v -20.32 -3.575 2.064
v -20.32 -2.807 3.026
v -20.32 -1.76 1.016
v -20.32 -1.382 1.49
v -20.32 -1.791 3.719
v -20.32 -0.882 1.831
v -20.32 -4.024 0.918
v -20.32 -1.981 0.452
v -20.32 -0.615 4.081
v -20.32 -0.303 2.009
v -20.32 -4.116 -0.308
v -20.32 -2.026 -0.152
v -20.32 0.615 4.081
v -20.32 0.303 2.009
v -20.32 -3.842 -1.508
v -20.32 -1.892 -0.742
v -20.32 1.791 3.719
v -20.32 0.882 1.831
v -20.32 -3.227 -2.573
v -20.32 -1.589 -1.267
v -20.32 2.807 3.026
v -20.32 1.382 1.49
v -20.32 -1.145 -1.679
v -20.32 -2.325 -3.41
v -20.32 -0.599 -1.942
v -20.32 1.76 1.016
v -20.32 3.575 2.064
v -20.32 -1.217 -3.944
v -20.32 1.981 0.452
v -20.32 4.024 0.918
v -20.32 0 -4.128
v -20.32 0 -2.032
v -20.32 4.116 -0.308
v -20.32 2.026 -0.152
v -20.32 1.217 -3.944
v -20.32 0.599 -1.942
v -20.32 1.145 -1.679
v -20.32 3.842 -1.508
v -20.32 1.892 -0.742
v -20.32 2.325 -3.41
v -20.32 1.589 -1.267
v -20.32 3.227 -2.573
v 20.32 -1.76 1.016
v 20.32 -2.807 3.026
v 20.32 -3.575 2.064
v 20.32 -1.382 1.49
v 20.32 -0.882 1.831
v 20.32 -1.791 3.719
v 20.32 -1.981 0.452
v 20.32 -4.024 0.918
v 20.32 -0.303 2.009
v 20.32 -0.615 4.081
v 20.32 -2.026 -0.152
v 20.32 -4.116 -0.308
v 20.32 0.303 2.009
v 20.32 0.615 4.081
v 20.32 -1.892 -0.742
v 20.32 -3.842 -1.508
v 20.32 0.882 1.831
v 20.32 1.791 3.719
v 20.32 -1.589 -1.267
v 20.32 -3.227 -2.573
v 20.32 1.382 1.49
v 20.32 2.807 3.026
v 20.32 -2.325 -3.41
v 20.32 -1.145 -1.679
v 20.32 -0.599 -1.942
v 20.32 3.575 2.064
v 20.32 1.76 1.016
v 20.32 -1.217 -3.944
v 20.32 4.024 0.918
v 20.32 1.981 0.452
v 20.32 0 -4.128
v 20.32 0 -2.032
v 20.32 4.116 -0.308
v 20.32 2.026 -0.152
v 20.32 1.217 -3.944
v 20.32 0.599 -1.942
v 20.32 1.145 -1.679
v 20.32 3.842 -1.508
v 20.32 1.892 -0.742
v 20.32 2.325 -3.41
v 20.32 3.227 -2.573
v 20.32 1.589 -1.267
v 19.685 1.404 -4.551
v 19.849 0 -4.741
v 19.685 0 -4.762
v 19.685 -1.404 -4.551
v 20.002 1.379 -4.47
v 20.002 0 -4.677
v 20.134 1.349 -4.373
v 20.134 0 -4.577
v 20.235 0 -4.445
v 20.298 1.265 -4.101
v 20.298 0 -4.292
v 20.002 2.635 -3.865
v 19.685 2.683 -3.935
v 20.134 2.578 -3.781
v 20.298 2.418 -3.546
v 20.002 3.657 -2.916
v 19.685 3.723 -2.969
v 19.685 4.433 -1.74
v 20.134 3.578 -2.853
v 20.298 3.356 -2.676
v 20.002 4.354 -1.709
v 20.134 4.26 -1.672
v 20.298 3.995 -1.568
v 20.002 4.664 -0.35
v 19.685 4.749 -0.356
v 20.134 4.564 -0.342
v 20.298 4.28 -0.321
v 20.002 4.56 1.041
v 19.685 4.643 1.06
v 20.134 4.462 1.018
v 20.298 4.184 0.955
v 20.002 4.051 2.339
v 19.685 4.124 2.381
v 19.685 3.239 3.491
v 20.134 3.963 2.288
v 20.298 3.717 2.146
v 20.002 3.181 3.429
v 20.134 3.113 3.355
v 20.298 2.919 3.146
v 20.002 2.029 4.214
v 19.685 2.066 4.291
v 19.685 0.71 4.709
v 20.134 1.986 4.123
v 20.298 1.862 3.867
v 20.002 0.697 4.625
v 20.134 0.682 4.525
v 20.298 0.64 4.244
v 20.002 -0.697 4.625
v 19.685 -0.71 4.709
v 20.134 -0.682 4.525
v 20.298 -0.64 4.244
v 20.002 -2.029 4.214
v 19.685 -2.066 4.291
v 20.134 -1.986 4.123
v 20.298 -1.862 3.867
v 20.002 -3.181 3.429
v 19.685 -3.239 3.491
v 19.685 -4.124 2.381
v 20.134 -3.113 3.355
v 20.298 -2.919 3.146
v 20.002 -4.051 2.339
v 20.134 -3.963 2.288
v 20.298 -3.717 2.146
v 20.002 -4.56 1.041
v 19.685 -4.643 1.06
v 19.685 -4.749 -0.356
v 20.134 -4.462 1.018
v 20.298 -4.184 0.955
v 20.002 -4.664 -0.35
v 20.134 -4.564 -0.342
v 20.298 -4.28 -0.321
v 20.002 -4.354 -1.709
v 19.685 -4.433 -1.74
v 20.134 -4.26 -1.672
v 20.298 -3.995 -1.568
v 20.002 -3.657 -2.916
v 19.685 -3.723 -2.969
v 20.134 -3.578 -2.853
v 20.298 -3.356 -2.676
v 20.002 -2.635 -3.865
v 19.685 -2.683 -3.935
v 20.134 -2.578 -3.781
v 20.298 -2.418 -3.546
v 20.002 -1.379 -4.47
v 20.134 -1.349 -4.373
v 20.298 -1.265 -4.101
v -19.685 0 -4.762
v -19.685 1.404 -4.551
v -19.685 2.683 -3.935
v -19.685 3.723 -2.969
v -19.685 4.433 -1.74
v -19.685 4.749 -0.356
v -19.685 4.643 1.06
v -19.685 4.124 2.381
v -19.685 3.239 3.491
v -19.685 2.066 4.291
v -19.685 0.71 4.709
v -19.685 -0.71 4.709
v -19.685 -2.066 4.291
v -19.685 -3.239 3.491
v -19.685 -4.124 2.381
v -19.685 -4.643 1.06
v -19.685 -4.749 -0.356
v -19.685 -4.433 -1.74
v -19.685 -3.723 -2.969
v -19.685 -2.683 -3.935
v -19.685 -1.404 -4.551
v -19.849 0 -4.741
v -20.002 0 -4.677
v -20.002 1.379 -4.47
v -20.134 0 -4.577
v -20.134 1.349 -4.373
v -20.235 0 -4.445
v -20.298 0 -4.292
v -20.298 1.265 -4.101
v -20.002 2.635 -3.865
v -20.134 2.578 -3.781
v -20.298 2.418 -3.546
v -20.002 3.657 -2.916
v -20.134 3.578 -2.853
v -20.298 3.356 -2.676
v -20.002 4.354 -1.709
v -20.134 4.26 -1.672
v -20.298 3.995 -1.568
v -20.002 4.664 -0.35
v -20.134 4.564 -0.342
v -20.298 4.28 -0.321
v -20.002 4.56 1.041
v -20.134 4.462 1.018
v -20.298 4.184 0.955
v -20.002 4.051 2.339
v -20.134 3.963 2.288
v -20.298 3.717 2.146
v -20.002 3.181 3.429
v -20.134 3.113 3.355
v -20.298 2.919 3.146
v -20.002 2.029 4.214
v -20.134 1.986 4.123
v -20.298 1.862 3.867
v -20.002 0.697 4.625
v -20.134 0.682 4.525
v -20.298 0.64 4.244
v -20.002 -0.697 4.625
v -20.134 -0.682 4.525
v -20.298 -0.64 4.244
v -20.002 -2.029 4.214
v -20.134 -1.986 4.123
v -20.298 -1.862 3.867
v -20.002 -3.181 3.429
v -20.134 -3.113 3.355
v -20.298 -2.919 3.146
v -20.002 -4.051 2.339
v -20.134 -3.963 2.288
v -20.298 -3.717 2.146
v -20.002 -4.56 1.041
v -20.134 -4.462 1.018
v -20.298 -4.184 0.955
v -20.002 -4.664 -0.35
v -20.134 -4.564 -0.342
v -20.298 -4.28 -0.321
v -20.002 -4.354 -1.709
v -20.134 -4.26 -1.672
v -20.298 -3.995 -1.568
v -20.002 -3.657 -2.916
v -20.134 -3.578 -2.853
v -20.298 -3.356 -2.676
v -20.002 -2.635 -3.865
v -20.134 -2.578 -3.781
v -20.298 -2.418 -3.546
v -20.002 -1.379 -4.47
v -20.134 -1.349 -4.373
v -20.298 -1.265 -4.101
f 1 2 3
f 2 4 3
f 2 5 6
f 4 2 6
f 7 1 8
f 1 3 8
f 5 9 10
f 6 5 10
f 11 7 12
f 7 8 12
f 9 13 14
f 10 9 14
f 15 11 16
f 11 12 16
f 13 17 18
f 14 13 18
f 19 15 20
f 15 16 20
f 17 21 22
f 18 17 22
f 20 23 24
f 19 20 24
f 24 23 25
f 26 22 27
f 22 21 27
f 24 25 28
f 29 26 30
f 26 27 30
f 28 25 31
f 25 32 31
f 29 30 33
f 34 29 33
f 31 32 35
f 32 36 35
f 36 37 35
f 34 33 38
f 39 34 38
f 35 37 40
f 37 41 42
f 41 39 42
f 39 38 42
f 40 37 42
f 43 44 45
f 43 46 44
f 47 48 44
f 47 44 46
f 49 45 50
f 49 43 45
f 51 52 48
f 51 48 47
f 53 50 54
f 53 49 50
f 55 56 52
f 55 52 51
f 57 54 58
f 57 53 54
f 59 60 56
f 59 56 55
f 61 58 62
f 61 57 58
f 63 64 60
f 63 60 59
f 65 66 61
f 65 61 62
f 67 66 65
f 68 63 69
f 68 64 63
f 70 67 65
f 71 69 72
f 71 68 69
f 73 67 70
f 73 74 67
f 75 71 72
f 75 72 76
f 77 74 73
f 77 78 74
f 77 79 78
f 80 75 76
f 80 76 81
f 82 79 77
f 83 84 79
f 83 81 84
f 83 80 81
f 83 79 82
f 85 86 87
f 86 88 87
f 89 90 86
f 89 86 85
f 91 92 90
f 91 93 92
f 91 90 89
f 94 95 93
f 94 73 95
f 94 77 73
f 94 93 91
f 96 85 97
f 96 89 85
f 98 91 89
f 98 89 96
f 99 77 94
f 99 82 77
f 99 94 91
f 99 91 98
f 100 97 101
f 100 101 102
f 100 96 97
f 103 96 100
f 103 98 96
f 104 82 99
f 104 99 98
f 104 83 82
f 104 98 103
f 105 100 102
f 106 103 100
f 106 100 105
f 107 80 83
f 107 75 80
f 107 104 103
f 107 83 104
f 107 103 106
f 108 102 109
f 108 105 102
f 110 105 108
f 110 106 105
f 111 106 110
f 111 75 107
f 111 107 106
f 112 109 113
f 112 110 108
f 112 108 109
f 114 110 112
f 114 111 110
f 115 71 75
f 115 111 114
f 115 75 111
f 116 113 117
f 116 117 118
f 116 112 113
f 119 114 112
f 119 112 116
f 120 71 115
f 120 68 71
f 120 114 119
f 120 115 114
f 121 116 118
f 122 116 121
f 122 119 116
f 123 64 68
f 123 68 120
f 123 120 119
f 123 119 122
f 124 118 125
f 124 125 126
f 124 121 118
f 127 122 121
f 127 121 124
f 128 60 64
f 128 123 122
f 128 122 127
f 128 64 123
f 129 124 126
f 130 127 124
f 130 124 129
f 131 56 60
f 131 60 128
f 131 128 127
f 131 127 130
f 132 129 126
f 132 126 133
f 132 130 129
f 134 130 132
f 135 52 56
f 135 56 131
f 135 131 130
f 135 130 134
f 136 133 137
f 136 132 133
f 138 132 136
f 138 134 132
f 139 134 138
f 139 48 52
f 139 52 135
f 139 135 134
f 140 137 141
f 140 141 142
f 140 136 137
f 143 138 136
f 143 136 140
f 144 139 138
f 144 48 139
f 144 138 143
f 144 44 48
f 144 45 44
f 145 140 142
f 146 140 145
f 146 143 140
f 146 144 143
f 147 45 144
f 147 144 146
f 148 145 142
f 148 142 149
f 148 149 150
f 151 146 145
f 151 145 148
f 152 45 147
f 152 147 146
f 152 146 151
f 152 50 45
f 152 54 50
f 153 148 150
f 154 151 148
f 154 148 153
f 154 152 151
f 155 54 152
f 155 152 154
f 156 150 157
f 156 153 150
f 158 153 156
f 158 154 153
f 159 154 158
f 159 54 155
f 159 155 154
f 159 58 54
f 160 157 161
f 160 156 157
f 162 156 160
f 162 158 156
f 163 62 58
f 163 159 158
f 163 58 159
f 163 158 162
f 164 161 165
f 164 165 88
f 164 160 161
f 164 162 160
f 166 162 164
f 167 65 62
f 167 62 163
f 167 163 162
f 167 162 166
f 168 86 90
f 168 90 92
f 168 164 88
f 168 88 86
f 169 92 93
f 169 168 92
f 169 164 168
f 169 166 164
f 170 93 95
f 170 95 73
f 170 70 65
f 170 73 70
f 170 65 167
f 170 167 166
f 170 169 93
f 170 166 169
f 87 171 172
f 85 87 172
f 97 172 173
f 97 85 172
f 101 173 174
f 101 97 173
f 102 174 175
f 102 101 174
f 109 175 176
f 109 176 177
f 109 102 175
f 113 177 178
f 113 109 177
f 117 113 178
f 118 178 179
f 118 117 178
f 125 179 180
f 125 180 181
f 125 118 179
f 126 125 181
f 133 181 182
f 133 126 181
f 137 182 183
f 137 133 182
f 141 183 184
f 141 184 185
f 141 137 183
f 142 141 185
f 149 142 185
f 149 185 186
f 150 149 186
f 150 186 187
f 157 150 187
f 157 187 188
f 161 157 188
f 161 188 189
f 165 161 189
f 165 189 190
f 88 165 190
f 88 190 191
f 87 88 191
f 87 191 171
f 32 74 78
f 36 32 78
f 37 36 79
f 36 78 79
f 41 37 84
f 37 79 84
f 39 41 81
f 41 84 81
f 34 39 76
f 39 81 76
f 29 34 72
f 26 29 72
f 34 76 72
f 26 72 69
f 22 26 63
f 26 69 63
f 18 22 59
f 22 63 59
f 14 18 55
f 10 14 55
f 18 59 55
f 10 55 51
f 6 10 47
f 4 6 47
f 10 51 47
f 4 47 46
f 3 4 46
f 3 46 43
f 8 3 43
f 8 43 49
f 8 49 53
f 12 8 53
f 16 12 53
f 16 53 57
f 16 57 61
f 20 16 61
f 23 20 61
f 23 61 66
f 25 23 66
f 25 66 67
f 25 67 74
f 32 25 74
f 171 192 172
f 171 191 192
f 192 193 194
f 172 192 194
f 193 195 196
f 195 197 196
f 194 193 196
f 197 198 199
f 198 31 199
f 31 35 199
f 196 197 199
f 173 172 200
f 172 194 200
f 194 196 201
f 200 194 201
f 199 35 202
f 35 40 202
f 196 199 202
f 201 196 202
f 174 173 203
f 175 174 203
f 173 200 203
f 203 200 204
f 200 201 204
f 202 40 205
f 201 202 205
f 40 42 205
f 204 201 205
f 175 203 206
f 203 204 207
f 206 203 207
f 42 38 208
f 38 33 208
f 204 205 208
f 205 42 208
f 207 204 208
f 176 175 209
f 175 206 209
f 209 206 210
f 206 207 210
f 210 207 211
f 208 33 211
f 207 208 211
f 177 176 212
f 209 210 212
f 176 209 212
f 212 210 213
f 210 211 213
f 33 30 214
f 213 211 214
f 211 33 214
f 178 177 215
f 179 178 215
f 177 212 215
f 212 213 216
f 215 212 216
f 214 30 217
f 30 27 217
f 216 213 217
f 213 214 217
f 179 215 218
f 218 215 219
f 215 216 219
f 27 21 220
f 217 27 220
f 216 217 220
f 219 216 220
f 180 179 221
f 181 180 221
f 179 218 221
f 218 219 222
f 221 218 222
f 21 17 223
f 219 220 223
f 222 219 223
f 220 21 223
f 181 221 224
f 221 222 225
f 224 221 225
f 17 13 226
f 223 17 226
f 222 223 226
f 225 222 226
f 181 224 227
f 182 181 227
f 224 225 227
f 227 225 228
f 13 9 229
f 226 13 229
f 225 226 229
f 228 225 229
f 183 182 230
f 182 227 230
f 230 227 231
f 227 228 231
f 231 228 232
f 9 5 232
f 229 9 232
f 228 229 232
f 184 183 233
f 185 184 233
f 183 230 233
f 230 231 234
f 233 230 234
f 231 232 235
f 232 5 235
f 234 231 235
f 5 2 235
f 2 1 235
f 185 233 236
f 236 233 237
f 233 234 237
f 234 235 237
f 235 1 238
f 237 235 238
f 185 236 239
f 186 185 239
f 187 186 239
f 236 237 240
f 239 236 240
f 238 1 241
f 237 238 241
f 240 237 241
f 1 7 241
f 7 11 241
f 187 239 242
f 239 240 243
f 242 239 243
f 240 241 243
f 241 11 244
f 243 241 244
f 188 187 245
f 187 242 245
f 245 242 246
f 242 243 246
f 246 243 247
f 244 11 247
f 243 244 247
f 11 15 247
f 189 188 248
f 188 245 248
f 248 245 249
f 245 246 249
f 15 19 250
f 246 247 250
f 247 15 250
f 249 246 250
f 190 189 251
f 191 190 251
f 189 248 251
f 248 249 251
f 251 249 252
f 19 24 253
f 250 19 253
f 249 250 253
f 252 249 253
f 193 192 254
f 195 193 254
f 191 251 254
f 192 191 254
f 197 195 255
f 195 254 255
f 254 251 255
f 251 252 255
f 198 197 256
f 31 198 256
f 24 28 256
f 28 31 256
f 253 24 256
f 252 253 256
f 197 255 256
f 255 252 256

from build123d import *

# Parameters (mm, degrees)
SKETCH1_R           = 4.7625
BOSS_EXTRUDE1_DEPTH = 20.32
SKETCH3_R           = 2.032
CUT_EXTRUDE1_DEPTH  = 42.194325004
FILLET1_R           = 0.635


with BuildPart() as part:
    # Sketch1 → Boss-Extrude1 (new, symmetric)
    with BuildSketch(Plane(origin=(0, 0, 0), x_dir=(0, 0, -1), z_dir=(1, 0, 0))):
        Circle(SKETCH1_R)
    extrude(amount=BOSS_EXTRUDE1_DEPTH, both=True)

    # Sketch3 → Cut-Extrude1 (cut, through all)
    with BuildSketch(Plane(origin=(20.32, 0, 0), x_dir=(0, 0, -1), z_dir=(1, 0, 0))):
        Circle(SKETCH3_R)
    extrude(amount=-CUT_EXTRUDE1_DEPTH, mode=Mode.SUBTRACT)

    # Fillet1
    fillet1_edges = [part.edges().sort_by_distance(p)[0] for p in [
        (-20.32, 0, 4.7625),
        (20.32, 0, 4.7625),
    ]]
    fillet(fillet1_edges, radius=FILLET1_R)


solid = part.part
